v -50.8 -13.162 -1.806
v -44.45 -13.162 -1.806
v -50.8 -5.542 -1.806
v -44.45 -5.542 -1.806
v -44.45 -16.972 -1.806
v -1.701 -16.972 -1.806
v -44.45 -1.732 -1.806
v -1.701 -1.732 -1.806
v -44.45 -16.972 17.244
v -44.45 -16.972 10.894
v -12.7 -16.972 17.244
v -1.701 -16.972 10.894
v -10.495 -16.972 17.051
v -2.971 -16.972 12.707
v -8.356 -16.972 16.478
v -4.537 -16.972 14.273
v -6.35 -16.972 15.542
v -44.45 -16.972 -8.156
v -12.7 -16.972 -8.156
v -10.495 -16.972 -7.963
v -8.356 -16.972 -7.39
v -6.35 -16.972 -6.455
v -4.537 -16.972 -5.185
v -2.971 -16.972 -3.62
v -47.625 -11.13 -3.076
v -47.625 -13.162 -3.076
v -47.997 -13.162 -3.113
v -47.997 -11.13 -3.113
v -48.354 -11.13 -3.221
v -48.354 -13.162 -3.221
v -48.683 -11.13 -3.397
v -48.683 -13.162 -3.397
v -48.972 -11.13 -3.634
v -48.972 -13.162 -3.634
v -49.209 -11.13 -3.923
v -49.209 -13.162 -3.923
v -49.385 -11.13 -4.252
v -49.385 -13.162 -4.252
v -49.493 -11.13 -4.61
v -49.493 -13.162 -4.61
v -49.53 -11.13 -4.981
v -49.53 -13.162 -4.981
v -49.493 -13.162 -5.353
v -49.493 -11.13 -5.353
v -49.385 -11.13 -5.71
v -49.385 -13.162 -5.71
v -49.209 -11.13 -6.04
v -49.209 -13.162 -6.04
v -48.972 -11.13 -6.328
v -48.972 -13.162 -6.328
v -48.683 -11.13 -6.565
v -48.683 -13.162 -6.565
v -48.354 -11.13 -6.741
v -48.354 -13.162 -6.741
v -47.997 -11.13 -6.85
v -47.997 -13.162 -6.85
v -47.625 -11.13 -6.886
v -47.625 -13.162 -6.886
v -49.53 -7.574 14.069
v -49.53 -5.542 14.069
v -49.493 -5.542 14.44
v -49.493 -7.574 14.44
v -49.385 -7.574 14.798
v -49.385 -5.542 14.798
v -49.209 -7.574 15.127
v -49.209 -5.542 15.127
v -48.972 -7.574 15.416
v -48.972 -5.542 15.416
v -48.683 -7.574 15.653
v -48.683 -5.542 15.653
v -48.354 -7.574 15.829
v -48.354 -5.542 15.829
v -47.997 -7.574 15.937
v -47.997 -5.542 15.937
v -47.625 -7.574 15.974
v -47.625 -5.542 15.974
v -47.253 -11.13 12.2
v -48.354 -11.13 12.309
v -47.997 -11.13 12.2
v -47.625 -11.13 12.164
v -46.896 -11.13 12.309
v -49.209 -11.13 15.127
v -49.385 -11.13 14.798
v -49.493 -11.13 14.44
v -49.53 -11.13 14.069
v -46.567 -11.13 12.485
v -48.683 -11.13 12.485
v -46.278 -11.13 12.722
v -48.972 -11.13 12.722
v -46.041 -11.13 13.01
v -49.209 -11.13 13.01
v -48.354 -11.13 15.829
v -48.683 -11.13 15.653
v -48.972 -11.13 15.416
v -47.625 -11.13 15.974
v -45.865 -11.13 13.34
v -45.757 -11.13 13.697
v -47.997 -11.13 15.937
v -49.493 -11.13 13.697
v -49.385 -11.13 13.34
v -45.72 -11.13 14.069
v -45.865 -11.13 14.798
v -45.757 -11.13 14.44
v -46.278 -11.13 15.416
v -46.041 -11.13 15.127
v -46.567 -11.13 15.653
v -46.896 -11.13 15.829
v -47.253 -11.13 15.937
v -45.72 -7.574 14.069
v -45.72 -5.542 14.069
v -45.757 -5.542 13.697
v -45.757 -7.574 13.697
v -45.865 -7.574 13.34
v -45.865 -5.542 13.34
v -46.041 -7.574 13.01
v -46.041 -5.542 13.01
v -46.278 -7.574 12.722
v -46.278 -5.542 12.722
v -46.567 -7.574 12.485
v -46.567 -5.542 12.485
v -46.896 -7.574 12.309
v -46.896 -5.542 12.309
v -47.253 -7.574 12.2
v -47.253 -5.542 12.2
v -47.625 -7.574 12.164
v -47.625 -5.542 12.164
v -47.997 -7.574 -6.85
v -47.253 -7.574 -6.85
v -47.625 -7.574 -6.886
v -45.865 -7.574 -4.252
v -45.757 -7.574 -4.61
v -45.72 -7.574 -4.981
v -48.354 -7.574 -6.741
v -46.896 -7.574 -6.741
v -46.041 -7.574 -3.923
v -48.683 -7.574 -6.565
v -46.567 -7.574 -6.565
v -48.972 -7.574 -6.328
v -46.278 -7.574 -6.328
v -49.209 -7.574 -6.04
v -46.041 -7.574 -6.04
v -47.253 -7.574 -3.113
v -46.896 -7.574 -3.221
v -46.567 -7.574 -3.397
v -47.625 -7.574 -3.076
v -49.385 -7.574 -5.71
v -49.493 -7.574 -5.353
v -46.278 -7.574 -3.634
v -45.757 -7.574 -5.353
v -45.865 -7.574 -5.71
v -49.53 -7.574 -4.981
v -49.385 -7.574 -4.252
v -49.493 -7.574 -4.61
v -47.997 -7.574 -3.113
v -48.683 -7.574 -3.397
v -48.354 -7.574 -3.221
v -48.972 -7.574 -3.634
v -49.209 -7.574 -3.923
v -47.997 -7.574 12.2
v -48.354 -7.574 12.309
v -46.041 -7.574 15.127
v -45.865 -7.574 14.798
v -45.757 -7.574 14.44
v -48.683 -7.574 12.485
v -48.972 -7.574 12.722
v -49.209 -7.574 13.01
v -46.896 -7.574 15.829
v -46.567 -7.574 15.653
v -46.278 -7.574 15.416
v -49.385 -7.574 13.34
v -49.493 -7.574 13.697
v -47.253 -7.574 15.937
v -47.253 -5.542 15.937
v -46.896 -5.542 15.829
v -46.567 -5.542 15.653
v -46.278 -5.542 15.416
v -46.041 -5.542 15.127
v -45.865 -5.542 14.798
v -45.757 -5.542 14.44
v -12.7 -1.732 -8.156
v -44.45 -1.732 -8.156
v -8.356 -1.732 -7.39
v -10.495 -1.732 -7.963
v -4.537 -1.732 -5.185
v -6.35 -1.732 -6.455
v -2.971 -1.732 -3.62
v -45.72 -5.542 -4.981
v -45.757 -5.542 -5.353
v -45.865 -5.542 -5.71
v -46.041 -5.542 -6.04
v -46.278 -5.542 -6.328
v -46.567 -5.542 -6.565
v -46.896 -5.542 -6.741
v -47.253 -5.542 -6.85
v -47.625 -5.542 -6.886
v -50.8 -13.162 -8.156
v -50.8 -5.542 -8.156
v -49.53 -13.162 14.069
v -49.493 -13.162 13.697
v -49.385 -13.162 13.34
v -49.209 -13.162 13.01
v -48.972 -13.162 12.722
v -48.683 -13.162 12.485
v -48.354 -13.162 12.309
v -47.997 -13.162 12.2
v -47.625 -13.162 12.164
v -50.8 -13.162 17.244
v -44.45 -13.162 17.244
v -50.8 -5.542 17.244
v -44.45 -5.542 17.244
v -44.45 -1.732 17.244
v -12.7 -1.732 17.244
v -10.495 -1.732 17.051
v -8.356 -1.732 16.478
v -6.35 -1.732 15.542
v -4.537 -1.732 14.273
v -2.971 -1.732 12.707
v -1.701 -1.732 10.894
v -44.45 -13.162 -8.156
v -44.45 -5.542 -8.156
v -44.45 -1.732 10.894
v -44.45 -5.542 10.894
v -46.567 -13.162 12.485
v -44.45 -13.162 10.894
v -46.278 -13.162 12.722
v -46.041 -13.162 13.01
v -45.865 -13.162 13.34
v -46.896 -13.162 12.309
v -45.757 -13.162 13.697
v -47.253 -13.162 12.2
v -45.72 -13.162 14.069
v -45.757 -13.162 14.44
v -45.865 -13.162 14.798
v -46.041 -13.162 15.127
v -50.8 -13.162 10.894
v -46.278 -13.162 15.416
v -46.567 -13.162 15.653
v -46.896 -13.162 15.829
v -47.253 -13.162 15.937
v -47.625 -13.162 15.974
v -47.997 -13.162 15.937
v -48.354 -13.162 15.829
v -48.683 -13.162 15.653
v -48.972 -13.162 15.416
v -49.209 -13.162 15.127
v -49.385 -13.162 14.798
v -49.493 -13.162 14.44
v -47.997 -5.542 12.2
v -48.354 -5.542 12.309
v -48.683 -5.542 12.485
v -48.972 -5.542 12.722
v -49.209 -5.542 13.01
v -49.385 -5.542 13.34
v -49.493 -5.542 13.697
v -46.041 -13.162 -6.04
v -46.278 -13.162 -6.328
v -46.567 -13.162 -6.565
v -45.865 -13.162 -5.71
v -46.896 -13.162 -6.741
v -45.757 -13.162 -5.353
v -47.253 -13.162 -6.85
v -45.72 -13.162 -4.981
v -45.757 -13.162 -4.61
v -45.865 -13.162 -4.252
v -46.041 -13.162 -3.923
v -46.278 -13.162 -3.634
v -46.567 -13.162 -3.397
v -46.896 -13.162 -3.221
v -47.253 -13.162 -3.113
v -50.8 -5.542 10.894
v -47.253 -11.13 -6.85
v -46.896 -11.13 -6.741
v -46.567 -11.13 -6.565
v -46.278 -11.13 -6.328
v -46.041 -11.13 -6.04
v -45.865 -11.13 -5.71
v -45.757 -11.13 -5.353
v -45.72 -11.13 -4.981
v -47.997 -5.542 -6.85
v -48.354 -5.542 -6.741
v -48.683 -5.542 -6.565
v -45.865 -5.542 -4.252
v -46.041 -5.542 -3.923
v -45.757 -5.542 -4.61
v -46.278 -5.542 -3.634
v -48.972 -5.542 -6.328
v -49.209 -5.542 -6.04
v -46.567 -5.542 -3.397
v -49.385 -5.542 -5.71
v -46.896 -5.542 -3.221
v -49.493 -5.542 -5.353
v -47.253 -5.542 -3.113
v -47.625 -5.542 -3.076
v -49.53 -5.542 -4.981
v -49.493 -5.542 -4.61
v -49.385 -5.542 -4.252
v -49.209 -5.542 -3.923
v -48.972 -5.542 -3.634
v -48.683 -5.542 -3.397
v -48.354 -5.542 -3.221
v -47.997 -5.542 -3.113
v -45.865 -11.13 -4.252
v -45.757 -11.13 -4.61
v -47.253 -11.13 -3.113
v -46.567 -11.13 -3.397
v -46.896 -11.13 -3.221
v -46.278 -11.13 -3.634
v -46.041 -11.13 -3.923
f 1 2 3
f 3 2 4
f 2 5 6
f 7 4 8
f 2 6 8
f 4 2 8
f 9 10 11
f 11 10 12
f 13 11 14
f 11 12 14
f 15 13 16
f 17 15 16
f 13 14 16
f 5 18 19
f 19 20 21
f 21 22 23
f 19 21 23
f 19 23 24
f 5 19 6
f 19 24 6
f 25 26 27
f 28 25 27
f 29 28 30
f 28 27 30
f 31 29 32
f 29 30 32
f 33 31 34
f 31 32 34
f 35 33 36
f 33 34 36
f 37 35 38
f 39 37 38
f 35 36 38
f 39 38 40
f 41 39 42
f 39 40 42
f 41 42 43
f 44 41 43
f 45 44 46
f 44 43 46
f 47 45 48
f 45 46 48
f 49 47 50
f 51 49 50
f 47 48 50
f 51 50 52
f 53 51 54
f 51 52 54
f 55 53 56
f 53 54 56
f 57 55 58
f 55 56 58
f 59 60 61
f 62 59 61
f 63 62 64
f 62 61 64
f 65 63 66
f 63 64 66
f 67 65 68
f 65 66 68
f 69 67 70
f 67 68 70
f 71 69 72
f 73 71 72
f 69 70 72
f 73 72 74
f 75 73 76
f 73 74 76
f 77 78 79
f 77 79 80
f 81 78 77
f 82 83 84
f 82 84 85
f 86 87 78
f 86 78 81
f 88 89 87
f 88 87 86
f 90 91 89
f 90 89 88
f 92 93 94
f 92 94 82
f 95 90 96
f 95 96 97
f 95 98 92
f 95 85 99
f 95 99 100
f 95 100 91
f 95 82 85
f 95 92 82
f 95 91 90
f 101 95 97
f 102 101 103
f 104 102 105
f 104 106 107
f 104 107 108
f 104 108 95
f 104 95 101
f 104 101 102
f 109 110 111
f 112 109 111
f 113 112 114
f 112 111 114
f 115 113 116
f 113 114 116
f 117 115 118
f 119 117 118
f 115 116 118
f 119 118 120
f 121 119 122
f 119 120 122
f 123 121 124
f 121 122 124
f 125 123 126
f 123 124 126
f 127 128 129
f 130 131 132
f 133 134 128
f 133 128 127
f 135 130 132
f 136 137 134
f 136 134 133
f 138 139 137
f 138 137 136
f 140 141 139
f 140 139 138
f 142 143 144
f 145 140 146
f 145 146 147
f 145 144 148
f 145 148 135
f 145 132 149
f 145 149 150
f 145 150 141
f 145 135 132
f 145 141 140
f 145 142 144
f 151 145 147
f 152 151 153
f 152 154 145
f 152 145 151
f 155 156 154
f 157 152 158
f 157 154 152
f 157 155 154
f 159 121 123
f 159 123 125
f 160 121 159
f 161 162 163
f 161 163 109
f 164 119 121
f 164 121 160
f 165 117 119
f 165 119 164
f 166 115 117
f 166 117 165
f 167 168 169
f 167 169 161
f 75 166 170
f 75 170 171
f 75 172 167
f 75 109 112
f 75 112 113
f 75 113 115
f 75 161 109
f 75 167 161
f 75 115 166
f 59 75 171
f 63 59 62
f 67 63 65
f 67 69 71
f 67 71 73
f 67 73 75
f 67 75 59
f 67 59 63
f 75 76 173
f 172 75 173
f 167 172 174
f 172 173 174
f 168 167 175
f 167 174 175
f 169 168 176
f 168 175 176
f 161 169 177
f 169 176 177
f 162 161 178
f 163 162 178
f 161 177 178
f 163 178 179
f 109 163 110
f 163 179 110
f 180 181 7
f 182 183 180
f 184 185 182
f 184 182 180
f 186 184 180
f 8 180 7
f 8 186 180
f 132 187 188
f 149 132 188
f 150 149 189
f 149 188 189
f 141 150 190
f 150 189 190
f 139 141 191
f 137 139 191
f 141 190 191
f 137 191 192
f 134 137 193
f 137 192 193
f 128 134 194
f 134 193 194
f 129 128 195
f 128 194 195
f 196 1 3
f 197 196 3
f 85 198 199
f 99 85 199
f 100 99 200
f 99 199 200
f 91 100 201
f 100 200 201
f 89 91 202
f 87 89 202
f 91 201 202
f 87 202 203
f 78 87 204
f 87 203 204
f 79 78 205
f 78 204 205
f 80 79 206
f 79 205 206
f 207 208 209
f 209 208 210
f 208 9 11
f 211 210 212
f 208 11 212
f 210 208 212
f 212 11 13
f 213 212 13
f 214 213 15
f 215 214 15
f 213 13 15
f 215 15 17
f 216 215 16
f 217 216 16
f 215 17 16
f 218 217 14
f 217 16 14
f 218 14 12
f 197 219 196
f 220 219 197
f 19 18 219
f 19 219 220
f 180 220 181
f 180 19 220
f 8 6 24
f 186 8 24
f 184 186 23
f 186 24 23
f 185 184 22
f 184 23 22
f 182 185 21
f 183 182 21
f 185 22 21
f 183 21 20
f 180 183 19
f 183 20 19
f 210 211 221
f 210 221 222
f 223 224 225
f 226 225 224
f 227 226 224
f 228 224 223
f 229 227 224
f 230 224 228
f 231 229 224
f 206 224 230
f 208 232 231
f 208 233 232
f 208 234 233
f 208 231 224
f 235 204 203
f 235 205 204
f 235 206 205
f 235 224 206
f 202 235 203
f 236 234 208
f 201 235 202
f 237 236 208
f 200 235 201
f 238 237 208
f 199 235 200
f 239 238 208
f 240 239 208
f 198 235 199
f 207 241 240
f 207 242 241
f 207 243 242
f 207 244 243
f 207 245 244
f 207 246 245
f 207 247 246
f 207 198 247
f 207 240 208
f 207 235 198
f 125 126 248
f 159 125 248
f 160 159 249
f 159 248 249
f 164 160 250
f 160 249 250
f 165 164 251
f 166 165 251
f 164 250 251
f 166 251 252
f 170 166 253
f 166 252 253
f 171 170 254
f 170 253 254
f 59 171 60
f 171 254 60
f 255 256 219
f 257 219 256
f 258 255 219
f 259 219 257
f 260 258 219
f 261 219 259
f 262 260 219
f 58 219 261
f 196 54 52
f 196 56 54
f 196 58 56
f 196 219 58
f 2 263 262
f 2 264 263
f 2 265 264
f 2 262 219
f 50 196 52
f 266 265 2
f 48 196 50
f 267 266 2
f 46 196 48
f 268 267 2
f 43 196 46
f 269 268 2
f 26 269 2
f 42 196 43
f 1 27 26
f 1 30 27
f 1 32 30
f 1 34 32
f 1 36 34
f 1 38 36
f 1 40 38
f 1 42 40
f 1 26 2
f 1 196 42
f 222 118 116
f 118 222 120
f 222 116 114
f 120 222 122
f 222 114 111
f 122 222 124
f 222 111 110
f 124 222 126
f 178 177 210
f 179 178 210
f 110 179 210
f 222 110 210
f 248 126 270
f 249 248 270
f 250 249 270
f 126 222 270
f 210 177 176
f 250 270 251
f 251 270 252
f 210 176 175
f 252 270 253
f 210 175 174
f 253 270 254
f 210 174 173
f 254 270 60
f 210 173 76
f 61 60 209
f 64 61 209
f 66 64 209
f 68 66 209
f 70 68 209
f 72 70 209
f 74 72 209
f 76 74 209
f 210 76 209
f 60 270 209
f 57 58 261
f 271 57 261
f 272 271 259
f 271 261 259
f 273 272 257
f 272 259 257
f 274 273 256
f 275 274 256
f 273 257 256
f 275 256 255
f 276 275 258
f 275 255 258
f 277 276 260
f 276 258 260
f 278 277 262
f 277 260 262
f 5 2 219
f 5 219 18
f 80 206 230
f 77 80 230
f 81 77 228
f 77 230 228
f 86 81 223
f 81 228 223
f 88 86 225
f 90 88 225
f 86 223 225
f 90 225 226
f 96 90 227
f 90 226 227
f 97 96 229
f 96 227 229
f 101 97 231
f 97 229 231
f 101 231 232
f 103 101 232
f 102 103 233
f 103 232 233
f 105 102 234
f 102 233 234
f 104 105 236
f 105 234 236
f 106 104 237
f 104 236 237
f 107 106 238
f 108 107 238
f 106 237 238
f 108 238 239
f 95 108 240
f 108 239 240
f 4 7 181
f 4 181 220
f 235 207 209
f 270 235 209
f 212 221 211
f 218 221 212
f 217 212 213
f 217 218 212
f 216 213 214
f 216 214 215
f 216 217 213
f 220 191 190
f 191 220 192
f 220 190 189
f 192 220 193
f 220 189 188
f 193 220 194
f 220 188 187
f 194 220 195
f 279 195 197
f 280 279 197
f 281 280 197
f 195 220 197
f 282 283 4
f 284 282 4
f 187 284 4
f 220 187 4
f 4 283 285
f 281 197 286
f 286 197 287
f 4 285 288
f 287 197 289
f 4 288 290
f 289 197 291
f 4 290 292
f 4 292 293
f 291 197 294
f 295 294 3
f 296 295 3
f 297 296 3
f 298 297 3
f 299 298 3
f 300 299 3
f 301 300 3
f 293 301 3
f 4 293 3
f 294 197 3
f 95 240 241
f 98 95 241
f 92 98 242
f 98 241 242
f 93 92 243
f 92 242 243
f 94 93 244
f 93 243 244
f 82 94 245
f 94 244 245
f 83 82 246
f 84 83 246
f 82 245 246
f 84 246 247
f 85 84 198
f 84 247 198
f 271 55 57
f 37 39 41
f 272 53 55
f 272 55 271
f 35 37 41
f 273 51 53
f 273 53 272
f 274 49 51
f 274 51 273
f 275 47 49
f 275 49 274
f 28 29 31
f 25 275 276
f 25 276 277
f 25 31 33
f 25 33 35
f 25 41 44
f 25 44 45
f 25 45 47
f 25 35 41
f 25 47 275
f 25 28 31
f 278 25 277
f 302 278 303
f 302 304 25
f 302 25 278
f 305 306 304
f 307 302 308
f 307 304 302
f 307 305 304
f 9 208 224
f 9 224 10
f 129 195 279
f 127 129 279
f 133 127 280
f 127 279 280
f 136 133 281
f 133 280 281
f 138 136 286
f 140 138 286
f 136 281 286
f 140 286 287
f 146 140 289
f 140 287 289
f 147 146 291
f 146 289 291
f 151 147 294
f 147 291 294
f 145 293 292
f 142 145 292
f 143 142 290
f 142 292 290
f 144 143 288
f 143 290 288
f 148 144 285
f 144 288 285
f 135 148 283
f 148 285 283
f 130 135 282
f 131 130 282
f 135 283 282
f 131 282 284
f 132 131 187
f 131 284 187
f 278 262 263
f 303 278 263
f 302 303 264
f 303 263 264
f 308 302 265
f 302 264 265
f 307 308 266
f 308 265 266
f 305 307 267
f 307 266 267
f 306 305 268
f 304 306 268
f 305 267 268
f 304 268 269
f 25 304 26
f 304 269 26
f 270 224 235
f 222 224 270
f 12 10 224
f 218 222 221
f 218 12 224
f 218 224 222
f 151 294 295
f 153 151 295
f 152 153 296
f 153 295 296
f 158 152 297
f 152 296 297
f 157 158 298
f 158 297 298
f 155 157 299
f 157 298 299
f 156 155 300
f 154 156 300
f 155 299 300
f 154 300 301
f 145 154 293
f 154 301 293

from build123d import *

# Parameters (mm, degrees)
F0_W      = 15.24
F0_H      = 6.35
F1_DEPTH  = 50.8
F3_DEPTH  = 15.24
F5_DEPTH  = 15.24
F6_W      = 3.81
F6_H      = 6.35
F8_DEPTH  = 6.35
F7_W      = 3.81
F7_H      = 6.35
F9_DEPTH  = 6.35
F12_DEPTH = 2.032
F13_DEPTH = 2.032
F16_DEPTH = 2.032
F17_DEPTH = 2.032


with BuildPart() as f1:
    # F0 (on Right) → F1 (new body)
    with BuildSketch(Plane.YZ):
        with Locations((-9.3524721428, 14.0688081446)):
            Rectangle(F0_W, F0_H)
    extrude(amount=-F1_DEPTH)

    # F2 (on face) → F3 (cut, through all)
    with BuildSketch(Plane.XZ.offset(16.9724721428)):
        with BuildLine():
            ThreePointArc((-12.7, 17.2438081446), (-6.35, 15.5423307727), (-1.7014773719, 10.8938081446))
            Line((-1.7014773719, 10.8938081446), (0, 10.8938081446))
            Line((0, 10.8938081446), (0, 17.2438081446))
            Line((0, 17.2438081446), (-12.7, 17.2438081446))
        make_face()
    extrude(amount=-F3_DEPTH, mode=Mode.SUBTRACT)

    # F6 (on face) → F8 (cut)
    with BuildSketch(Plane(origin=(-50.8, 0, 0), x_dir=(0, -1, 0), z_dir=(-1, 0, 0))):
        with Locations((3.6374721428, 14.0688081446)):
            Rectangle(F6_W, F6_H)
        with Locations((15.0674721428, 14.0688081446)):
            Rectangle(F6_W, F6_H)
    extrude(amount=-F8_DEPTH, mode=Mode.SUBTRACT)

    # F10 (on face) → F12 (cut)
    with BuildSketch(Plane.XZ.offset(13.1624721428)):
        with BuildLine():
            Line((-49.53, 14.0688081446), (-47.625, 14.0688081446))
            Line((-47.625, 14.0688081446), (-47.625, 15.9738081446))
            ThreePointArc((-47.625, 15.9738081446), (-48.9720384182, 15.4158465628), (-49.53, 14.0688081446))
        make_face()
        with BuildLine():
            Line((-47.625, 14.0688081446), (-45.72, 14.0688081446))
            ThreePointArc((-45.72, 14.0688081446), (-46.2779615818, 15.4158465628), (-47.625, 15.9738081446))
            Line((-47.625, 15.9738081446), (-47.625, 14.0688081446))
        make_face()
        with BuildLine():
            ThreePointArc((-47.625, 12.1638081446), (-46.2779615818, 12.7217697265), (-45.72, 14.0688081446))
            Line((-45.72, 14.0688081446), (-47.625, 14.0688081446))
            Line((-47.625, 14.0688081446), (-47.625, 12.1638081446))
        make_face()
        with BuildLine():
            Line((-47.625, 12.1638081446), (-47.625, 14.0688081446))
            Line((-47.625, 14.0688081446), (-49.53, 14.0688081446))
            ThreePointArc((-49.53, 14.0688081446), (-48.9720384182, 12.7217697265), (-47.625, 12.1638081446))
        make_face()
    extrude(amount=-F12_DEPTH, mode=Mode.SUBTRACT)

    # F14 (on face) → F16 (cut)
    with BuildSketch(Plane(origin=(0, -5.5424721428, 0), x_dir=(-1, 0, 0), z_dir=(0, 1, 0))):
        with BuildLine():
            Line((45.72, 14.0688081446), (47.625, 14.0688081446))
            Line((47.625, 14.0688081446), (47.625, 15.9738081446))
            ThreePointArc((47.625, 15.9738081446), (46.2779615818, 15.4158465628), (45.72, 14.0688081446))
        make_face()
        with BuildLine():
            Line((47.625, 14.0688081446), (49.53, 14.0688081446))
            ThreePointArc((49.53, 14.0688081446), (48.9720384182, 15.4158465628), (47.625, 15.9738081446))
            Line((47.625, 15.9738081446), (47.625, 14.0688081446))
        make_face()
        with BuildLine():
            ThreePointArc((47.625, 12.1638081446), (48.9720384182, 12.7217697265), (49.53, 14.0688081446))
            Line((49.53, 14.0688081446), (47.625, 14.0688081446))
            Line((47.625, 14.0688081446), (47.625, 12.1638081446))
        make_face()
        with BuildLine():
            Line((47.625, 12.1638081446), (47.625, 14.0688081446))
            Line((47.625, 14.0688081446), (45.72, 14.0688081446))
            ThreePointArc((45.72, 14.0688081446), (46.2779615818, 12.7217697265), (47.625, 12.1638081446))
        make_face()
    extrude(amount=-F16_DEPTH, mode=Mode.SUBTRACT)


with BuildPart() as f1b:
    # F0 (on Right) → F1, piece 2 (new body)
    with BuildSketch(Plane.YZ):
        with Locations((-9.3524721428, -4.9811918554)):
            Rectangle(F0_W, F0_H)
    extrude(amount=-F1_DEPTH)

    # F4 (on face) → F5 (cut, through all)
    with BuildSketch(Plane.XZ.offset(16.9724721428)):
        with BuildLine():
            Line((0, -1.8061918554), (-1.7014773719, -1.8061918554))
            ThreePointArc((-1.7014773719, -1.8061918554), (-6.350000005, -6.4547144863), (-12.7000000115, -8.1561918554))
            Line((-12.7000000115, -8.1561918554), (0, -8.1561918554))
            Line((0, -8.1561918554), (0, -1.8061918554))
        make_face()
    extrude(amount=-F5_DEPTH, mode=Mode.SUBTRACT)

    # F7 (on face) → F9 (cut)
    with BuildSketch(Plane(origin=(-50.8, 0, 0), x_dir=(0, -1, 0), z_dir=(-1, 0, 0))):
        with Locations((3.6374721428, -4.9811918554)):
            Rectangle(F7_W, F7_H)
        with Locations((15.0674721428, -4.9811918554)):
            Rectangle(F7_W, F7_H)
    extrude(amount=-F9_DEPTH, mode=Mode.SUBTRACT)

    # F11 (on face) → F13 (cut)
    with BuildSketch(Plane.XZ.offset(13.1624721428)):
        with BuildLine():
            Line((-49.53, -4.9811918554), (-47.625, -4.9811918554))
            Line((-47.625, -4.9811918554), (-47.625, -3.0761918554))
            ThreePointArc((-47.625, -3.0761918554), (-48.9720384182, -3.6341534372), (-49.53, -4.9811918554))
        make_face()
        with BuildLine():
            Line((-47.625, -4.9811918554), (-45.72, -4.9811918554))
            ThreePointArc((-45.72, -4.9811918554), (-46.2779615818, -3.6341534372), (-47.625, -3.0761918554))
            Line((-47.625, -3.0761918554), (-47.625, -4.9811918554))
        make_face()
        with BuildLine():
            ThreePointArc((-47.625, -6.8861918554), (-46.2779615818, -6.3282302735), (-45.72, -4.9811918554))
            Line((-45.72, -4.9811918554), (-47.625, -4.9811918554))
            Line((-47.625, -4.9811918554), (-47.625, -6.8861918554))
        make_face()
        with BuildLine():
            Line((-47.625, -6.8861918554), (-47.625, -4.9811918554))
            Line((-47.625, -4.9811918554), (-49.53, -4.9811918554))
            ThreePointArc((-49.53, -4.9811918554), (-48.9720384182, -6.3282302735), (-47.625, -6.8861918554))
        make_face()
    extrude(amount=-F13_DEPTH, mode=Mode.SUBTRACT)

    # F15 (on face) → F17 (cut)
    with BuildSketch(Plane(origin=(0, -5.5424721428, 0), x_dir=(-1, 0, 0), z_dir=(0, 1, 0))):
        with BuildLine():
            Line((45.72, -4.9811918554), (47.625, -4.9811918554))
            Line((47.625, -4.9811918554), (47.625, -3.0761918554))
            ThreePointArc((47.625, -3.0761918554), (46.2779615818, -3.6341534372), (45.72, -4.9811918554))
        make_face()
        with BuildLine():
            Line((47.625, -4.9811918554), (49.53, -4.9811918554))
            ThreePointArc((49.53, -4.9811918554), (48.9720384182, -3.6341534372), (47.625, -3.0761918554))
            Line((47.625, -3.0761918554), (47.625, -4.9811918554))
        make_face()
        with BuildLine():
            ThreePointArc((47.625, -6.8861918554), (48.9720384182, -6.3282302735), (49.53, -4.9811918554))
            Line((49.53, -4.9811918554), (47.625, -4.9811918554))
            Line((47.625, -4.9811918554), (47.625, -6.8861918554))
        make_face()
        with BuildLine():
            Line((47.625, -6.8861918554), (47.625, -4.9811918554))
            Line((47.625, -4.9811918554), (45.72, -4.9811918554))
            ThreePointArc((45.72, -4.9811918554), (46.2779615818, -6.3282302735), (47.625, -6.8861918554))
        make_face()
    extrude(amount=-F17_DEPTH, mode=Mode.SUBTRACT)


solid = Compound([f1.part, f1b.part])
